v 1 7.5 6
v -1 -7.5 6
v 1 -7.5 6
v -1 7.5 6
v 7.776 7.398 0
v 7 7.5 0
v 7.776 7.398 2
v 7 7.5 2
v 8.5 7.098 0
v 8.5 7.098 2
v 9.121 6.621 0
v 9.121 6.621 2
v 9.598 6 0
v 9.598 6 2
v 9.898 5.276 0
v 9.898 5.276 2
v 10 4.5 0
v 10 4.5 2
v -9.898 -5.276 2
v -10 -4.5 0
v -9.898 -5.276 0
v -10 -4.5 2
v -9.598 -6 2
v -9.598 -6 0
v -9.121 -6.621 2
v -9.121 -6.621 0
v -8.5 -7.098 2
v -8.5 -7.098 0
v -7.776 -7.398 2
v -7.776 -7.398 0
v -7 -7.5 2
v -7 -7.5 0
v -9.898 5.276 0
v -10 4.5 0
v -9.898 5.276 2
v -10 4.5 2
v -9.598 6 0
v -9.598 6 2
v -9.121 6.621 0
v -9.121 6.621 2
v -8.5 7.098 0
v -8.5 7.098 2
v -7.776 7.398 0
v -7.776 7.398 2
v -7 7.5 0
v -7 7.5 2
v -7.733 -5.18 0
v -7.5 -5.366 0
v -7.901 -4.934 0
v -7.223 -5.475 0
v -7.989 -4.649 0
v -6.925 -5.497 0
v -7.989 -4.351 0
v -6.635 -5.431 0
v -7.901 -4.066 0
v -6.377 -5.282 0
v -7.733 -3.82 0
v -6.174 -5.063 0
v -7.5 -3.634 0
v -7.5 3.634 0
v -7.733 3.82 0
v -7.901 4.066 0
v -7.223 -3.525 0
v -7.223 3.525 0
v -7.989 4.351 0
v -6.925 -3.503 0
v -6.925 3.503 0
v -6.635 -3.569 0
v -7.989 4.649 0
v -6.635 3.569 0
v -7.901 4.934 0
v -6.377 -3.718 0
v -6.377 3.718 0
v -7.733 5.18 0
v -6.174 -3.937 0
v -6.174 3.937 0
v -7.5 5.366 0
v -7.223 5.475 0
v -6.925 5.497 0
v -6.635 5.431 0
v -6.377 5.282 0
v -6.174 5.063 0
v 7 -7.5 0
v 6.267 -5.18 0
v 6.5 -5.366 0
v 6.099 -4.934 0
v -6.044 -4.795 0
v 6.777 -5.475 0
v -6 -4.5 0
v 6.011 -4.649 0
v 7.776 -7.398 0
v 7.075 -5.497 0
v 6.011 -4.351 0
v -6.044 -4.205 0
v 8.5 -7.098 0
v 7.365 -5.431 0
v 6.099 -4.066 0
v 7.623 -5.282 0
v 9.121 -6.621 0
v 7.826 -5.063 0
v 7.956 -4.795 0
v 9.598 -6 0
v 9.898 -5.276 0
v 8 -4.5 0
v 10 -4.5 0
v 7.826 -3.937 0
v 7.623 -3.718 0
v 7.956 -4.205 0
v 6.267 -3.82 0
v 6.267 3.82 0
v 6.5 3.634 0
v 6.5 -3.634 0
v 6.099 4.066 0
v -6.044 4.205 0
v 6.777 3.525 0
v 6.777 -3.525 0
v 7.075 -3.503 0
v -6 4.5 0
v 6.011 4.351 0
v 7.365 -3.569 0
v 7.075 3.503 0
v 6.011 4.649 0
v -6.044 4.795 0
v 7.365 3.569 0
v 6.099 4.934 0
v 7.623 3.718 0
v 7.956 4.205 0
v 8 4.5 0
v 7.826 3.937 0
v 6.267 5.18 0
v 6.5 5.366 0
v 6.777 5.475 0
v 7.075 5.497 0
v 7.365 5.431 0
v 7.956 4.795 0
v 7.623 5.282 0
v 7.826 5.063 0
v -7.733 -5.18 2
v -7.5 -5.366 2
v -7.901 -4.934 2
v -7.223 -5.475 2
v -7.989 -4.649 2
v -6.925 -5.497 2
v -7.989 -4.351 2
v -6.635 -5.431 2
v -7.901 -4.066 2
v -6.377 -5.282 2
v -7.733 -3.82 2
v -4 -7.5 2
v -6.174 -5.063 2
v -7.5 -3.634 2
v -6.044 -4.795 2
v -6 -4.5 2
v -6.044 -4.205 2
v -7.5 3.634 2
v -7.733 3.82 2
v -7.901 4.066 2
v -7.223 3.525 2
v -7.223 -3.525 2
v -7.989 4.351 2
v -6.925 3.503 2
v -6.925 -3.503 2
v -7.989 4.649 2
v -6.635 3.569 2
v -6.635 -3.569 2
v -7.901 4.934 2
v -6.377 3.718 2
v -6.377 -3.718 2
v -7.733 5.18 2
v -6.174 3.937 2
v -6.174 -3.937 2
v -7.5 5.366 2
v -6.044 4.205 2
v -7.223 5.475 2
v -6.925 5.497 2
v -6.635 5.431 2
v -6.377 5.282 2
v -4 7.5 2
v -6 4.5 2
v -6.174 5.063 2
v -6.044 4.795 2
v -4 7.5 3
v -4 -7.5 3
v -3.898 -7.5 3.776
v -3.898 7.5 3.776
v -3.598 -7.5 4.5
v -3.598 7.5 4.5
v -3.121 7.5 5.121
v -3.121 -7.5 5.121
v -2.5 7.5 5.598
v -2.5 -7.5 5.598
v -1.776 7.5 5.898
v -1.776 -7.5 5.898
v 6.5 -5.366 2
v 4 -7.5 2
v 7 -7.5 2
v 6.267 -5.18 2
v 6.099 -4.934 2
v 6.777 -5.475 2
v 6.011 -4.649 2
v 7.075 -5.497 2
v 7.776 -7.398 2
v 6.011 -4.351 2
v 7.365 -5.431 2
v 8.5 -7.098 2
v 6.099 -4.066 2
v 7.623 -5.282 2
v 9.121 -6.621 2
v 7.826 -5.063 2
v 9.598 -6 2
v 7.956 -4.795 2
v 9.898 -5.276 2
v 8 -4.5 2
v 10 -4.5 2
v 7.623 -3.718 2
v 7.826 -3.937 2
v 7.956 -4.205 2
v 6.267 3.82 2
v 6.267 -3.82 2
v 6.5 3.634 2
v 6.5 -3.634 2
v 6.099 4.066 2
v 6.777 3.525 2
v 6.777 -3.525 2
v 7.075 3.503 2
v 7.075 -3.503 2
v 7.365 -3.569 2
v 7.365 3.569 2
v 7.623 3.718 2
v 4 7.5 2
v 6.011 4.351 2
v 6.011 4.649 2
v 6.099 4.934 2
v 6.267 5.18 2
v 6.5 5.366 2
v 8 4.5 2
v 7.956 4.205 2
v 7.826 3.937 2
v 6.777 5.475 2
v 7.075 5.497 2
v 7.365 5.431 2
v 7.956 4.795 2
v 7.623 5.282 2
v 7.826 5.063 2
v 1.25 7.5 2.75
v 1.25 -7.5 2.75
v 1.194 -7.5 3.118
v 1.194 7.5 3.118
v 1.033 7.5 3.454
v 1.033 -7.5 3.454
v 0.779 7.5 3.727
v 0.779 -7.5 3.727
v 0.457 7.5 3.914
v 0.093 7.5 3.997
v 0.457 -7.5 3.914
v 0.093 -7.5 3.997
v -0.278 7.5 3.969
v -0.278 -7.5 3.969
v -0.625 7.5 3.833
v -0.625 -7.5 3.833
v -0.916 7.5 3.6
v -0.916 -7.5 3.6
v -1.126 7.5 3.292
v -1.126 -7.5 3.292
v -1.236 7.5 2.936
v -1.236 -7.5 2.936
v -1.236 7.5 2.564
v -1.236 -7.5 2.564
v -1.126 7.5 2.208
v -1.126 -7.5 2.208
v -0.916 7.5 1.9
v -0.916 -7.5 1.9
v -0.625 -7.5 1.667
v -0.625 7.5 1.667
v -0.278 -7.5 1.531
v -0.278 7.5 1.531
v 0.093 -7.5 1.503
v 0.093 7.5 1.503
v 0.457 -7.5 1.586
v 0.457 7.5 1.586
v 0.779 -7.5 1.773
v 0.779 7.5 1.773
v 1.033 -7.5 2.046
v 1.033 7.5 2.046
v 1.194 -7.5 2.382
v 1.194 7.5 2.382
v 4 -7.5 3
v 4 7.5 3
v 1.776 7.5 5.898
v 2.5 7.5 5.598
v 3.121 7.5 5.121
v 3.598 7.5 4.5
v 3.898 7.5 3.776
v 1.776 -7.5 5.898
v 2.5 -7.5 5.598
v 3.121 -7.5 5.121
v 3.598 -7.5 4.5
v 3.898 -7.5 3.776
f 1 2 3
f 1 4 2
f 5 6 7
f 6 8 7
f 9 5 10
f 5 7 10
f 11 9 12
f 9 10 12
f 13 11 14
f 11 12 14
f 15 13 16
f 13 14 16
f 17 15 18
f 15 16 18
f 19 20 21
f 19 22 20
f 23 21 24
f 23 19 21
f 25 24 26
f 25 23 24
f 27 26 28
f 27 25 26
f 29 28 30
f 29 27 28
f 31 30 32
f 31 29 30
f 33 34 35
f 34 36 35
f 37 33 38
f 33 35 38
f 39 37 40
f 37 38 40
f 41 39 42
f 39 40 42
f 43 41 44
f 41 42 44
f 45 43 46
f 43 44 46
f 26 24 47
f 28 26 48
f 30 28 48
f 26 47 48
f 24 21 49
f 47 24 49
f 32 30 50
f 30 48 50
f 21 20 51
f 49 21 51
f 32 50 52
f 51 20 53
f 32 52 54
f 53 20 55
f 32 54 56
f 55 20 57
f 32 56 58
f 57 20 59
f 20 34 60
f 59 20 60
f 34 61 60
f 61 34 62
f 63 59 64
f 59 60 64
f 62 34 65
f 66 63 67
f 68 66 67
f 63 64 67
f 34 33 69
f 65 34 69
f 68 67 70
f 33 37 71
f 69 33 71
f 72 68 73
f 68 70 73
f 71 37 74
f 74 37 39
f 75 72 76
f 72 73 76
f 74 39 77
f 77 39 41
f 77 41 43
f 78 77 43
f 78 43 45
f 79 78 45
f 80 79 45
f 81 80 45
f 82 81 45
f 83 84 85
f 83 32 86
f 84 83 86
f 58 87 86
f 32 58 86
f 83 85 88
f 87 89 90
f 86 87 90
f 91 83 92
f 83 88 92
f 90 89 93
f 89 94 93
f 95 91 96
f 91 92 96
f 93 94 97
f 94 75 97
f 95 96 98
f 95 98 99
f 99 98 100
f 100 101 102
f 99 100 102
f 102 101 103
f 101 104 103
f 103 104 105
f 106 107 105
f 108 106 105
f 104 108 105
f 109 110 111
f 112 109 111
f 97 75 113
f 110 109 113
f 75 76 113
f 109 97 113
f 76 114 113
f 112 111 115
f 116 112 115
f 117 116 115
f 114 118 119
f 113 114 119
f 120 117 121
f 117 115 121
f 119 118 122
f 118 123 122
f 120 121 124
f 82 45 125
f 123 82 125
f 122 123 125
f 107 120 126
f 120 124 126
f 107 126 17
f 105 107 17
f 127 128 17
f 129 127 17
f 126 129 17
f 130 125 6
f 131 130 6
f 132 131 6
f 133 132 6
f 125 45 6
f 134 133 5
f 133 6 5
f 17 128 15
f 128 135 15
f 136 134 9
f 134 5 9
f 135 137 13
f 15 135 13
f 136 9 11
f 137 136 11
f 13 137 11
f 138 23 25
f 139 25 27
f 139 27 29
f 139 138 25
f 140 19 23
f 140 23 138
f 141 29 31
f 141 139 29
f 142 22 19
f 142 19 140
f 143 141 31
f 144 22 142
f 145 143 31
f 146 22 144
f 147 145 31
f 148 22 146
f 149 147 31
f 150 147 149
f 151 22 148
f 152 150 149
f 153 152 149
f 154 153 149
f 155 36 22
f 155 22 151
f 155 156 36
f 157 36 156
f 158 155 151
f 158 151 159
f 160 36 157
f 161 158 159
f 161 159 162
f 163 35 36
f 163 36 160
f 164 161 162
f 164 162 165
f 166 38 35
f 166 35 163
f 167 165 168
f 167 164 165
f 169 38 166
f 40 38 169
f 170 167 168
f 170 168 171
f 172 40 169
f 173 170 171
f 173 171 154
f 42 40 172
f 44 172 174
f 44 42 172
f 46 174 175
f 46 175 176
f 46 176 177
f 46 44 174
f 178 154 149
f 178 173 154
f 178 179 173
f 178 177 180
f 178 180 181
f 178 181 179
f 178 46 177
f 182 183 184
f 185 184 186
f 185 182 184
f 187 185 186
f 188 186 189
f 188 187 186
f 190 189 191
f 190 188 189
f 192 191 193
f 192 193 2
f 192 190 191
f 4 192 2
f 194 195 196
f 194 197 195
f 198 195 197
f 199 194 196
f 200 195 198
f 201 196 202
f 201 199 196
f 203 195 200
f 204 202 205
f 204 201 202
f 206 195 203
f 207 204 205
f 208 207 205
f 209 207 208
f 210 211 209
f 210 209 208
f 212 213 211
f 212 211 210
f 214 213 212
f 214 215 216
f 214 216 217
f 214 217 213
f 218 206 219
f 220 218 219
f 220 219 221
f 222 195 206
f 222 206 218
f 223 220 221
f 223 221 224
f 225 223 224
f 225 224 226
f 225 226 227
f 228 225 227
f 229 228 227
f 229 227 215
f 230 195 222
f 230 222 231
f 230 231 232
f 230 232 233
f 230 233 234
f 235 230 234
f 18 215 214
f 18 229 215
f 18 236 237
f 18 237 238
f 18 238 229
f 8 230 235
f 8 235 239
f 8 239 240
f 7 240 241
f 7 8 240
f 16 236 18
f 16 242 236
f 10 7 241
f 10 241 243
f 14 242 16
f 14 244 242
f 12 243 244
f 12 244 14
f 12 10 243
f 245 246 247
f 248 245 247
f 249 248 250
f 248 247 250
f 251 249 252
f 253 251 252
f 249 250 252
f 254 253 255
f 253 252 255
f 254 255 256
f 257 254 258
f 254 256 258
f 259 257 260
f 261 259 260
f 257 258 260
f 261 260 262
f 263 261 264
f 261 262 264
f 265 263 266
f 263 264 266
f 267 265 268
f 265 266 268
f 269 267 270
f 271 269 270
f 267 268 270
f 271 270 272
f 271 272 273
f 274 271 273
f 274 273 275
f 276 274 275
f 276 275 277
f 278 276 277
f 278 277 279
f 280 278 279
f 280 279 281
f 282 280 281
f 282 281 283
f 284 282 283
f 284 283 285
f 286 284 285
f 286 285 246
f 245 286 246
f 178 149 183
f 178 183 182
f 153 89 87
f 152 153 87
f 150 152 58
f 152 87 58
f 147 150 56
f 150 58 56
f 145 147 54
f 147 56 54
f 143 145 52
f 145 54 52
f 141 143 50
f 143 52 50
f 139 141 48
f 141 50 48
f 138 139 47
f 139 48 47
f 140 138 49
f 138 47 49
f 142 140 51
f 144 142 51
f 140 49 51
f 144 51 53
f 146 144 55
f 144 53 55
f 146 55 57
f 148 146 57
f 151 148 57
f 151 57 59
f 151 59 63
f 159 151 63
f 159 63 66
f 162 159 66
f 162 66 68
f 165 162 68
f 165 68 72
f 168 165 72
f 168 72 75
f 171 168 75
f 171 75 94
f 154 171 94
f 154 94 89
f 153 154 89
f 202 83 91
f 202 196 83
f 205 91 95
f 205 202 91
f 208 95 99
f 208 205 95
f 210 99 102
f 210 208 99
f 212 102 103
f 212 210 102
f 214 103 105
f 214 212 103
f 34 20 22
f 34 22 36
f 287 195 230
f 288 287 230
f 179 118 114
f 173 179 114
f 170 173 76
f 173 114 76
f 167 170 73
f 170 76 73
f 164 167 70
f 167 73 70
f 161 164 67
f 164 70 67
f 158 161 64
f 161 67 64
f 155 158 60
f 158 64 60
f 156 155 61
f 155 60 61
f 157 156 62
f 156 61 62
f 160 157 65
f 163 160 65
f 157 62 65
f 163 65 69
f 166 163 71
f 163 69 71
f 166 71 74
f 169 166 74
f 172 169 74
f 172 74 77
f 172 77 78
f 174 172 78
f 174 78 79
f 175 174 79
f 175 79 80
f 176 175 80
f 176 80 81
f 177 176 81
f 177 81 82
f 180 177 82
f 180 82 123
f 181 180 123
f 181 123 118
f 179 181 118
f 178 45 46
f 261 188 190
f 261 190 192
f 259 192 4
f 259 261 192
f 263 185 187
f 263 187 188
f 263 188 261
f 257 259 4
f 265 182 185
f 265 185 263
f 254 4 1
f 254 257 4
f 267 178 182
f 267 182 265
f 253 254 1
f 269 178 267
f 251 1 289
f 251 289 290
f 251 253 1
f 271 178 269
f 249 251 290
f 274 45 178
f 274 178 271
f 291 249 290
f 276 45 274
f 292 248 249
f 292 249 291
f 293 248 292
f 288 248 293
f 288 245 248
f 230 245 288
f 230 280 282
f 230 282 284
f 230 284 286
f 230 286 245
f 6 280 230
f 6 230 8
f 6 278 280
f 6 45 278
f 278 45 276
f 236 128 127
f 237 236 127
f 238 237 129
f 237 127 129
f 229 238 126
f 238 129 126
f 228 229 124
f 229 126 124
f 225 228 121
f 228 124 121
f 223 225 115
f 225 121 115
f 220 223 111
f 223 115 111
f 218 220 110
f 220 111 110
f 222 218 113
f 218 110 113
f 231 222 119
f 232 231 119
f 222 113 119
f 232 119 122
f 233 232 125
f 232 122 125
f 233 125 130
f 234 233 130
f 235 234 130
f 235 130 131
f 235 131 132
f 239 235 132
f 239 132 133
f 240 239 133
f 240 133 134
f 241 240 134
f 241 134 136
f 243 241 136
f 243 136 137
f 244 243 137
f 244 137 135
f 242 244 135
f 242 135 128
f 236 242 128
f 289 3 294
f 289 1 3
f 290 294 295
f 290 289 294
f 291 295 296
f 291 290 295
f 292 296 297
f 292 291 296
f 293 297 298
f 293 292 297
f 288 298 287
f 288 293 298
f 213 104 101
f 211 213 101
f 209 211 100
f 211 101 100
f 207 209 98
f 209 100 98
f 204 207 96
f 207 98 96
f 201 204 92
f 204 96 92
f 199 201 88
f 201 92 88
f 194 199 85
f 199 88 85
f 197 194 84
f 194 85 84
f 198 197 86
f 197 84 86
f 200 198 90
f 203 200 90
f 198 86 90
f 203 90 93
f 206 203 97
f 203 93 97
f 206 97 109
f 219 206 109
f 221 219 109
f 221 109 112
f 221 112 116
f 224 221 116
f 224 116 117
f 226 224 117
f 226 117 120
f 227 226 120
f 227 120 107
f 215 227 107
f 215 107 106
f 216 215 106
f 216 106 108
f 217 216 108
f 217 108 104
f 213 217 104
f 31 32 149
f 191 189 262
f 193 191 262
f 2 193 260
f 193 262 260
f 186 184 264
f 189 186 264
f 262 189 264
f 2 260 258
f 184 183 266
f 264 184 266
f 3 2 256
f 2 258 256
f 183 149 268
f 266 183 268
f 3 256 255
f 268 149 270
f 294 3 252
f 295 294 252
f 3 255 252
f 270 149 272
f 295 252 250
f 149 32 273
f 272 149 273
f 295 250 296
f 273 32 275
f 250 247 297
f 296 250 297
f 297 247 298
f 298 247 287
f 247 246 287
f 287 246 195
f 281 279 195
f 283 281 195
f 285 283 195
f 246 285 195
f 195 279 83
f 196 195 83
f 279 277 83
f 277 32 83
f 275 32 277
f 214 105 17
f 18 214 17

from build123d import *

# Parameters (mm, degrees)
F0_W     = 20
F0_H     = 15
F1_DEPTH = 2
F2_W     = 8
F2_H     = 15
F3_DEPTH = 4
F4_R     = 1.25
F5_DEPTH = 15.001
F6_R     = 1
F7_DEPTH = 25
F8_R     = 3


with BuildPart() as f1:
    # F0 (on Top) → F1 (new body)
    with BuildSketch(Plane.XY):
        Rectangle(F0_W, F0_H)
    extrude(amount=F1_DEPTH)

    # F2 (on face) → F3 (join)
    with BuildSketch(Plane.XY.offset(2)):
        Rectangle(F2_W, F2_H)
    extrude(amount=F3_DEPTH)

    # F4 (on face) → F5 (cut, through all)
    with BuildSketch(Plane.XZ.offset(7.5)):
        with Locations((0, 2.75)):
            Circle(F4_R)
    extrude(amount=-F5_DEPTH, mode=Mode.SUBTRACT)

    # F6 (on face) → F7 (cut)
    with BuildSketch(Plane(origin=(0, 0, 0), x_dir=(1, 0, 0), z_dir=(0, 0, -1))):
        with Locations((-7, 4.5)):
            Circle(F6_R)
        with Locations((7, 4.5)):
            Circle(F6_R)
        with Locations((7, -4.5)):
            Circle(F6_R)
        with Locations((-7, -4.5)):
            Circle(F6_R)
    extrude(amount=-F7_DEPTH, mode=Mode.SUBTRACT)

    # F8
    f8_edges = [f1.edges().sort_by_distance(p)[0] for p in [
        (4, 0, 6),
        (-4, 0, 6),
        (10, -7.5, 1),
        (10, 7.5, 1),
        (-10, -7.5, 1),
        (-10, 7.5, 1),
    ]]
    fillet(f8_edges, radius=F8_R)


solid = f1.part
